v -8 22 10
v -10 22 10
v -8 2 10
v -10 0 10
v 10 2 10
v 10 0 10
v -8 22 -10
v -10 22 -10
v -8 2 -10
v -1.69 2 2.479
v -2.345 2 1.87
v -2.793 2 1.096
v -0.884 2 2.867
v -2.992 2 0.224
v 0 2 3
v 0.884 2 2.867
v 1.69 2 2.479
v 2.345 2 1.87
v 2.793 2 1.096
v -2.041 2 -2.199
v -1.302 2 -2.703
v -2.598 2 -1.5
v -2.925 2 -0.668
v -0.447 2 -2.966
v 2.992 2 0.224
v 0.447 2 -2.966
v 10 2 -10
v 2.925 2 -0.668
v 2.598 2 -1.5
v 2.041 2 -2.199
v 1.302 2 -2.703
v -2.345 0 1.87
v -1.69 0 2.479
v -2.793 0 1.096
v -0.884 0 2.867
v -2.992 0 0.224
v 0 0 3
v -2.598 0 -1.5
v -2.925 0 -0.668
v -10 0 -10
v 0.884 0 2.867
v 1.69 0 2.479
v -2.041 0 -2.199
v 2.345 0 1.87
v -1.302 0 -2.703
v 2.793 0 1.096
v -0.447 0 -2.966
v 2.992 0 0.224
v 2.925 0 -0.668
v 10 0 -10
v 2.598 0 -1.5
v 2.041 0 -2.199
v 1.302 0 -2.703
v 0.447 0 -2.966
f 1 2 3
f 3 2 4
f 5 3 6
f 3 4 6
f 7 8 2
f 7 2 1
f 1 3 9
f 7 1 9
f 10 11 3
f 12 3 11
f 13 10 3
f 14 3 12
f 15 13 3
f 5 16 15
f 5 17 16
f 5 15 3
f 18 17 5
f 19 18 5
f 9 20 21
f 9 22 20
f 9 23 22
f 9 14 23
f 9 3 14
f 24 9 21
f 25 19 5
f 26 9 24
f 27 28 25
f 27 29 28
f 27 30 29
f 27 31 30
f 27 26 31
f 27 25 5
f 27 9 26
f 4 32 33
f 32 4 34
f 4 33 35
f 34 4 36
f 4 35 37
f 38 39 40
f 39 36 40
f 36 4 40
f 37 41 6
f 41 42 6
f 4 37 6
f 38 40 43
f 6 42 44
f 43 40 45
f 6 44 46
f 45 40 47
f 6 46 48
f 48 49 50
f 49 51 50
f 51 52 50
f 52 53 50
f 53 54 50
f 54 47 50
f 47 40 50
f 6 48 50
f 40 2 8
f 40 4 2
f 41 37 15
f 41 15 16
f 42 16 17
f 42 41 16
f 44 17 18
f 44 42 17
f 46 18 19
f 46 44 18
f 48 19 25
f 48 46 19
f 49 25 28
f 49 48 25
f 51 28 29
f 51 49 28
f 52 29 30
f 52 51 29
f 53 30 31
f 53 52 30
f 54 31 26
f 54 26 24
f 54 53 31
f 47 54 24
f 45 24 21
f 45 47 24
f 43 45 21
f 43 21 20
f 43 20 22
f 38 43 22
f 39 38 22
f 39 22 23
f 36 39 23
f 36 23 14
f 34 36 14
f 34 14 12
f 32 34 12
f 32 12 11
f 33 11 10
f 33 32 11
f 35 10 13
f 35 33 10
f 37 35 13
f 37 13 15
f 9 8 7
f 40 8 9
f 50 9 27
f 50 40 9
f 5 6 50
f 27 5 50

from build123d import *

# Parameters (mm, degrees)
SKETCH_2_W      = 20
SKETCH_2_H      = 20
SKETCH_2_R      = 3
EXTRUDE_1_DEPTH = 2
SKETCH_3_W      = 2
SKETCH_3_H      = 20
EXTRUDE_2_DEPTH = 20


with BuildPart() as part:
    # ｽｹｯﾁ2 → ﾎﾞｽ - 押し出し1 (new body)
    with BuildSketch(Plane(origin=(0, 0, 0), x_dir=(1, 0, 0), z_dir=(0, 1, 0))):
        Rectangle(SKETCH_2_W, SKETCH_2_H)
        with Locations(Location((0, 0, 0), (0, 0, 270))):
            Circle(SKETCH_2_R, mode=Mode.SUBTRACT)
    extrude(amount=EXTRUDE_1_DEPTH)

    # ｽｹｯﾁ3 → ﾎﾞｽ - 押し出し2 (add)
    with BuildSketch(Plane(origin=(0, 2, 0), x_dir=(1, 0, 0), z_dir=(0, 1, 0))):
        with Locations((-9, 0)):
            Rectangle(SKETCH_3_W, SKETCH_3_H)
    extrude(amount=EXTRUDE_2_DEPTH)


solid = part.part
